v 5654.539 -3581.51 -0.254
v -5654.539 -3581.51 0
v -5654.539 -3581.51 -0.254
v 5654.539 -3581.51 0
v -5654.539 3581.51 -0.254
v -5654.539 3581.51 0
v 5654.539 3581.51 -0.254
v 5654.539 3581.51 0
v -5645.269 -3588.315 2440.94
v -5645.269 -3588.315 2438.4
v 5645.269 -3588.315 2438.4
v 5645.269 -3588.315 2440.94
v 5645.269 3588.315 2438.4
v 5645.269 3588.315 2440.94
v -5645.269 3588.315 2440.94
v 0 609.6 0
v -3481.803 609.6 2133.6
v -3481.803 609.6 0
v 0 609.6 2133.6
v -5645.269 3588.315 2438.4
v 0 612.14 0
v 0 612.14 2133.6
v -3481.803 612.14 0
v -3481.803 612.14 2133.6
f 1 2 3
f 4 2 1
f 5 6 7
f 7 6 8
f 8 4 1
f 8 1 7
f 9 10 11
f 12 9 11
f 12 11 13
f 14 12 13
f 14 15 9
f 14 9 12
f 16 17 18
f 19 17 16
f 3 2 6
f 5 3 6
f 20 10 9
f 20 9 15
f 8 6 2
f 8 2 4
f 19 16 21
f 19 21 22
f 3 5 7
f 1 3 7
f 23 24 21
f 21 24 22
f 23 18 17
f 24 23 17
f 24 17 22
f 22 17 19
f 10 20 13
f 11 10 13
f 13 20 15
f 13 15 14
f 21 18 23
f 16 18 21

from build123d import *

# Parameters (mm, degrees)
F1_START = -609.6
F0_W     = 3481.8031354523
F0_H     = 2133.6
F1_DEPTH = 2.54
F2_W     = 11309.0782165527
F2_H     = 7163.0191802979
F3_DEPTH = 0.254
F5_START = 2438.4
F4_W     = 11290.5387878418
F4_H     = 7176.6300201416
F5_DEPTH = 2.54


with BuildPart() as f1:
    # F0 (on Front) → F1 (new body)
    with BuildSketch(Plane.XZ.offset(F1_START)):
        with Locations((-1740.9015677261, 1066.8)):
            Rectangle(F0_W, F0_H)
    extrude(amount=-F1_DEPTH)


with BuildPart() as f3:
    # F2 (on Top) → F3 (new body)
    with BuildSketch(Plane.XY):
        Rectangle(F2_W, F2_H)
    extrude(amount=-F3_DEPTH)


with BuildPart() as f5:
    # F4 (on Top) → F5 (new body)
    with BuildSketch(Plane.XY.offset(F5_START)):
        Rectangle(F4_W, F4_H)
    extrude(amount=F5_DEPTH)


solid = Compound([f1.part, f3.part, f5.part])
